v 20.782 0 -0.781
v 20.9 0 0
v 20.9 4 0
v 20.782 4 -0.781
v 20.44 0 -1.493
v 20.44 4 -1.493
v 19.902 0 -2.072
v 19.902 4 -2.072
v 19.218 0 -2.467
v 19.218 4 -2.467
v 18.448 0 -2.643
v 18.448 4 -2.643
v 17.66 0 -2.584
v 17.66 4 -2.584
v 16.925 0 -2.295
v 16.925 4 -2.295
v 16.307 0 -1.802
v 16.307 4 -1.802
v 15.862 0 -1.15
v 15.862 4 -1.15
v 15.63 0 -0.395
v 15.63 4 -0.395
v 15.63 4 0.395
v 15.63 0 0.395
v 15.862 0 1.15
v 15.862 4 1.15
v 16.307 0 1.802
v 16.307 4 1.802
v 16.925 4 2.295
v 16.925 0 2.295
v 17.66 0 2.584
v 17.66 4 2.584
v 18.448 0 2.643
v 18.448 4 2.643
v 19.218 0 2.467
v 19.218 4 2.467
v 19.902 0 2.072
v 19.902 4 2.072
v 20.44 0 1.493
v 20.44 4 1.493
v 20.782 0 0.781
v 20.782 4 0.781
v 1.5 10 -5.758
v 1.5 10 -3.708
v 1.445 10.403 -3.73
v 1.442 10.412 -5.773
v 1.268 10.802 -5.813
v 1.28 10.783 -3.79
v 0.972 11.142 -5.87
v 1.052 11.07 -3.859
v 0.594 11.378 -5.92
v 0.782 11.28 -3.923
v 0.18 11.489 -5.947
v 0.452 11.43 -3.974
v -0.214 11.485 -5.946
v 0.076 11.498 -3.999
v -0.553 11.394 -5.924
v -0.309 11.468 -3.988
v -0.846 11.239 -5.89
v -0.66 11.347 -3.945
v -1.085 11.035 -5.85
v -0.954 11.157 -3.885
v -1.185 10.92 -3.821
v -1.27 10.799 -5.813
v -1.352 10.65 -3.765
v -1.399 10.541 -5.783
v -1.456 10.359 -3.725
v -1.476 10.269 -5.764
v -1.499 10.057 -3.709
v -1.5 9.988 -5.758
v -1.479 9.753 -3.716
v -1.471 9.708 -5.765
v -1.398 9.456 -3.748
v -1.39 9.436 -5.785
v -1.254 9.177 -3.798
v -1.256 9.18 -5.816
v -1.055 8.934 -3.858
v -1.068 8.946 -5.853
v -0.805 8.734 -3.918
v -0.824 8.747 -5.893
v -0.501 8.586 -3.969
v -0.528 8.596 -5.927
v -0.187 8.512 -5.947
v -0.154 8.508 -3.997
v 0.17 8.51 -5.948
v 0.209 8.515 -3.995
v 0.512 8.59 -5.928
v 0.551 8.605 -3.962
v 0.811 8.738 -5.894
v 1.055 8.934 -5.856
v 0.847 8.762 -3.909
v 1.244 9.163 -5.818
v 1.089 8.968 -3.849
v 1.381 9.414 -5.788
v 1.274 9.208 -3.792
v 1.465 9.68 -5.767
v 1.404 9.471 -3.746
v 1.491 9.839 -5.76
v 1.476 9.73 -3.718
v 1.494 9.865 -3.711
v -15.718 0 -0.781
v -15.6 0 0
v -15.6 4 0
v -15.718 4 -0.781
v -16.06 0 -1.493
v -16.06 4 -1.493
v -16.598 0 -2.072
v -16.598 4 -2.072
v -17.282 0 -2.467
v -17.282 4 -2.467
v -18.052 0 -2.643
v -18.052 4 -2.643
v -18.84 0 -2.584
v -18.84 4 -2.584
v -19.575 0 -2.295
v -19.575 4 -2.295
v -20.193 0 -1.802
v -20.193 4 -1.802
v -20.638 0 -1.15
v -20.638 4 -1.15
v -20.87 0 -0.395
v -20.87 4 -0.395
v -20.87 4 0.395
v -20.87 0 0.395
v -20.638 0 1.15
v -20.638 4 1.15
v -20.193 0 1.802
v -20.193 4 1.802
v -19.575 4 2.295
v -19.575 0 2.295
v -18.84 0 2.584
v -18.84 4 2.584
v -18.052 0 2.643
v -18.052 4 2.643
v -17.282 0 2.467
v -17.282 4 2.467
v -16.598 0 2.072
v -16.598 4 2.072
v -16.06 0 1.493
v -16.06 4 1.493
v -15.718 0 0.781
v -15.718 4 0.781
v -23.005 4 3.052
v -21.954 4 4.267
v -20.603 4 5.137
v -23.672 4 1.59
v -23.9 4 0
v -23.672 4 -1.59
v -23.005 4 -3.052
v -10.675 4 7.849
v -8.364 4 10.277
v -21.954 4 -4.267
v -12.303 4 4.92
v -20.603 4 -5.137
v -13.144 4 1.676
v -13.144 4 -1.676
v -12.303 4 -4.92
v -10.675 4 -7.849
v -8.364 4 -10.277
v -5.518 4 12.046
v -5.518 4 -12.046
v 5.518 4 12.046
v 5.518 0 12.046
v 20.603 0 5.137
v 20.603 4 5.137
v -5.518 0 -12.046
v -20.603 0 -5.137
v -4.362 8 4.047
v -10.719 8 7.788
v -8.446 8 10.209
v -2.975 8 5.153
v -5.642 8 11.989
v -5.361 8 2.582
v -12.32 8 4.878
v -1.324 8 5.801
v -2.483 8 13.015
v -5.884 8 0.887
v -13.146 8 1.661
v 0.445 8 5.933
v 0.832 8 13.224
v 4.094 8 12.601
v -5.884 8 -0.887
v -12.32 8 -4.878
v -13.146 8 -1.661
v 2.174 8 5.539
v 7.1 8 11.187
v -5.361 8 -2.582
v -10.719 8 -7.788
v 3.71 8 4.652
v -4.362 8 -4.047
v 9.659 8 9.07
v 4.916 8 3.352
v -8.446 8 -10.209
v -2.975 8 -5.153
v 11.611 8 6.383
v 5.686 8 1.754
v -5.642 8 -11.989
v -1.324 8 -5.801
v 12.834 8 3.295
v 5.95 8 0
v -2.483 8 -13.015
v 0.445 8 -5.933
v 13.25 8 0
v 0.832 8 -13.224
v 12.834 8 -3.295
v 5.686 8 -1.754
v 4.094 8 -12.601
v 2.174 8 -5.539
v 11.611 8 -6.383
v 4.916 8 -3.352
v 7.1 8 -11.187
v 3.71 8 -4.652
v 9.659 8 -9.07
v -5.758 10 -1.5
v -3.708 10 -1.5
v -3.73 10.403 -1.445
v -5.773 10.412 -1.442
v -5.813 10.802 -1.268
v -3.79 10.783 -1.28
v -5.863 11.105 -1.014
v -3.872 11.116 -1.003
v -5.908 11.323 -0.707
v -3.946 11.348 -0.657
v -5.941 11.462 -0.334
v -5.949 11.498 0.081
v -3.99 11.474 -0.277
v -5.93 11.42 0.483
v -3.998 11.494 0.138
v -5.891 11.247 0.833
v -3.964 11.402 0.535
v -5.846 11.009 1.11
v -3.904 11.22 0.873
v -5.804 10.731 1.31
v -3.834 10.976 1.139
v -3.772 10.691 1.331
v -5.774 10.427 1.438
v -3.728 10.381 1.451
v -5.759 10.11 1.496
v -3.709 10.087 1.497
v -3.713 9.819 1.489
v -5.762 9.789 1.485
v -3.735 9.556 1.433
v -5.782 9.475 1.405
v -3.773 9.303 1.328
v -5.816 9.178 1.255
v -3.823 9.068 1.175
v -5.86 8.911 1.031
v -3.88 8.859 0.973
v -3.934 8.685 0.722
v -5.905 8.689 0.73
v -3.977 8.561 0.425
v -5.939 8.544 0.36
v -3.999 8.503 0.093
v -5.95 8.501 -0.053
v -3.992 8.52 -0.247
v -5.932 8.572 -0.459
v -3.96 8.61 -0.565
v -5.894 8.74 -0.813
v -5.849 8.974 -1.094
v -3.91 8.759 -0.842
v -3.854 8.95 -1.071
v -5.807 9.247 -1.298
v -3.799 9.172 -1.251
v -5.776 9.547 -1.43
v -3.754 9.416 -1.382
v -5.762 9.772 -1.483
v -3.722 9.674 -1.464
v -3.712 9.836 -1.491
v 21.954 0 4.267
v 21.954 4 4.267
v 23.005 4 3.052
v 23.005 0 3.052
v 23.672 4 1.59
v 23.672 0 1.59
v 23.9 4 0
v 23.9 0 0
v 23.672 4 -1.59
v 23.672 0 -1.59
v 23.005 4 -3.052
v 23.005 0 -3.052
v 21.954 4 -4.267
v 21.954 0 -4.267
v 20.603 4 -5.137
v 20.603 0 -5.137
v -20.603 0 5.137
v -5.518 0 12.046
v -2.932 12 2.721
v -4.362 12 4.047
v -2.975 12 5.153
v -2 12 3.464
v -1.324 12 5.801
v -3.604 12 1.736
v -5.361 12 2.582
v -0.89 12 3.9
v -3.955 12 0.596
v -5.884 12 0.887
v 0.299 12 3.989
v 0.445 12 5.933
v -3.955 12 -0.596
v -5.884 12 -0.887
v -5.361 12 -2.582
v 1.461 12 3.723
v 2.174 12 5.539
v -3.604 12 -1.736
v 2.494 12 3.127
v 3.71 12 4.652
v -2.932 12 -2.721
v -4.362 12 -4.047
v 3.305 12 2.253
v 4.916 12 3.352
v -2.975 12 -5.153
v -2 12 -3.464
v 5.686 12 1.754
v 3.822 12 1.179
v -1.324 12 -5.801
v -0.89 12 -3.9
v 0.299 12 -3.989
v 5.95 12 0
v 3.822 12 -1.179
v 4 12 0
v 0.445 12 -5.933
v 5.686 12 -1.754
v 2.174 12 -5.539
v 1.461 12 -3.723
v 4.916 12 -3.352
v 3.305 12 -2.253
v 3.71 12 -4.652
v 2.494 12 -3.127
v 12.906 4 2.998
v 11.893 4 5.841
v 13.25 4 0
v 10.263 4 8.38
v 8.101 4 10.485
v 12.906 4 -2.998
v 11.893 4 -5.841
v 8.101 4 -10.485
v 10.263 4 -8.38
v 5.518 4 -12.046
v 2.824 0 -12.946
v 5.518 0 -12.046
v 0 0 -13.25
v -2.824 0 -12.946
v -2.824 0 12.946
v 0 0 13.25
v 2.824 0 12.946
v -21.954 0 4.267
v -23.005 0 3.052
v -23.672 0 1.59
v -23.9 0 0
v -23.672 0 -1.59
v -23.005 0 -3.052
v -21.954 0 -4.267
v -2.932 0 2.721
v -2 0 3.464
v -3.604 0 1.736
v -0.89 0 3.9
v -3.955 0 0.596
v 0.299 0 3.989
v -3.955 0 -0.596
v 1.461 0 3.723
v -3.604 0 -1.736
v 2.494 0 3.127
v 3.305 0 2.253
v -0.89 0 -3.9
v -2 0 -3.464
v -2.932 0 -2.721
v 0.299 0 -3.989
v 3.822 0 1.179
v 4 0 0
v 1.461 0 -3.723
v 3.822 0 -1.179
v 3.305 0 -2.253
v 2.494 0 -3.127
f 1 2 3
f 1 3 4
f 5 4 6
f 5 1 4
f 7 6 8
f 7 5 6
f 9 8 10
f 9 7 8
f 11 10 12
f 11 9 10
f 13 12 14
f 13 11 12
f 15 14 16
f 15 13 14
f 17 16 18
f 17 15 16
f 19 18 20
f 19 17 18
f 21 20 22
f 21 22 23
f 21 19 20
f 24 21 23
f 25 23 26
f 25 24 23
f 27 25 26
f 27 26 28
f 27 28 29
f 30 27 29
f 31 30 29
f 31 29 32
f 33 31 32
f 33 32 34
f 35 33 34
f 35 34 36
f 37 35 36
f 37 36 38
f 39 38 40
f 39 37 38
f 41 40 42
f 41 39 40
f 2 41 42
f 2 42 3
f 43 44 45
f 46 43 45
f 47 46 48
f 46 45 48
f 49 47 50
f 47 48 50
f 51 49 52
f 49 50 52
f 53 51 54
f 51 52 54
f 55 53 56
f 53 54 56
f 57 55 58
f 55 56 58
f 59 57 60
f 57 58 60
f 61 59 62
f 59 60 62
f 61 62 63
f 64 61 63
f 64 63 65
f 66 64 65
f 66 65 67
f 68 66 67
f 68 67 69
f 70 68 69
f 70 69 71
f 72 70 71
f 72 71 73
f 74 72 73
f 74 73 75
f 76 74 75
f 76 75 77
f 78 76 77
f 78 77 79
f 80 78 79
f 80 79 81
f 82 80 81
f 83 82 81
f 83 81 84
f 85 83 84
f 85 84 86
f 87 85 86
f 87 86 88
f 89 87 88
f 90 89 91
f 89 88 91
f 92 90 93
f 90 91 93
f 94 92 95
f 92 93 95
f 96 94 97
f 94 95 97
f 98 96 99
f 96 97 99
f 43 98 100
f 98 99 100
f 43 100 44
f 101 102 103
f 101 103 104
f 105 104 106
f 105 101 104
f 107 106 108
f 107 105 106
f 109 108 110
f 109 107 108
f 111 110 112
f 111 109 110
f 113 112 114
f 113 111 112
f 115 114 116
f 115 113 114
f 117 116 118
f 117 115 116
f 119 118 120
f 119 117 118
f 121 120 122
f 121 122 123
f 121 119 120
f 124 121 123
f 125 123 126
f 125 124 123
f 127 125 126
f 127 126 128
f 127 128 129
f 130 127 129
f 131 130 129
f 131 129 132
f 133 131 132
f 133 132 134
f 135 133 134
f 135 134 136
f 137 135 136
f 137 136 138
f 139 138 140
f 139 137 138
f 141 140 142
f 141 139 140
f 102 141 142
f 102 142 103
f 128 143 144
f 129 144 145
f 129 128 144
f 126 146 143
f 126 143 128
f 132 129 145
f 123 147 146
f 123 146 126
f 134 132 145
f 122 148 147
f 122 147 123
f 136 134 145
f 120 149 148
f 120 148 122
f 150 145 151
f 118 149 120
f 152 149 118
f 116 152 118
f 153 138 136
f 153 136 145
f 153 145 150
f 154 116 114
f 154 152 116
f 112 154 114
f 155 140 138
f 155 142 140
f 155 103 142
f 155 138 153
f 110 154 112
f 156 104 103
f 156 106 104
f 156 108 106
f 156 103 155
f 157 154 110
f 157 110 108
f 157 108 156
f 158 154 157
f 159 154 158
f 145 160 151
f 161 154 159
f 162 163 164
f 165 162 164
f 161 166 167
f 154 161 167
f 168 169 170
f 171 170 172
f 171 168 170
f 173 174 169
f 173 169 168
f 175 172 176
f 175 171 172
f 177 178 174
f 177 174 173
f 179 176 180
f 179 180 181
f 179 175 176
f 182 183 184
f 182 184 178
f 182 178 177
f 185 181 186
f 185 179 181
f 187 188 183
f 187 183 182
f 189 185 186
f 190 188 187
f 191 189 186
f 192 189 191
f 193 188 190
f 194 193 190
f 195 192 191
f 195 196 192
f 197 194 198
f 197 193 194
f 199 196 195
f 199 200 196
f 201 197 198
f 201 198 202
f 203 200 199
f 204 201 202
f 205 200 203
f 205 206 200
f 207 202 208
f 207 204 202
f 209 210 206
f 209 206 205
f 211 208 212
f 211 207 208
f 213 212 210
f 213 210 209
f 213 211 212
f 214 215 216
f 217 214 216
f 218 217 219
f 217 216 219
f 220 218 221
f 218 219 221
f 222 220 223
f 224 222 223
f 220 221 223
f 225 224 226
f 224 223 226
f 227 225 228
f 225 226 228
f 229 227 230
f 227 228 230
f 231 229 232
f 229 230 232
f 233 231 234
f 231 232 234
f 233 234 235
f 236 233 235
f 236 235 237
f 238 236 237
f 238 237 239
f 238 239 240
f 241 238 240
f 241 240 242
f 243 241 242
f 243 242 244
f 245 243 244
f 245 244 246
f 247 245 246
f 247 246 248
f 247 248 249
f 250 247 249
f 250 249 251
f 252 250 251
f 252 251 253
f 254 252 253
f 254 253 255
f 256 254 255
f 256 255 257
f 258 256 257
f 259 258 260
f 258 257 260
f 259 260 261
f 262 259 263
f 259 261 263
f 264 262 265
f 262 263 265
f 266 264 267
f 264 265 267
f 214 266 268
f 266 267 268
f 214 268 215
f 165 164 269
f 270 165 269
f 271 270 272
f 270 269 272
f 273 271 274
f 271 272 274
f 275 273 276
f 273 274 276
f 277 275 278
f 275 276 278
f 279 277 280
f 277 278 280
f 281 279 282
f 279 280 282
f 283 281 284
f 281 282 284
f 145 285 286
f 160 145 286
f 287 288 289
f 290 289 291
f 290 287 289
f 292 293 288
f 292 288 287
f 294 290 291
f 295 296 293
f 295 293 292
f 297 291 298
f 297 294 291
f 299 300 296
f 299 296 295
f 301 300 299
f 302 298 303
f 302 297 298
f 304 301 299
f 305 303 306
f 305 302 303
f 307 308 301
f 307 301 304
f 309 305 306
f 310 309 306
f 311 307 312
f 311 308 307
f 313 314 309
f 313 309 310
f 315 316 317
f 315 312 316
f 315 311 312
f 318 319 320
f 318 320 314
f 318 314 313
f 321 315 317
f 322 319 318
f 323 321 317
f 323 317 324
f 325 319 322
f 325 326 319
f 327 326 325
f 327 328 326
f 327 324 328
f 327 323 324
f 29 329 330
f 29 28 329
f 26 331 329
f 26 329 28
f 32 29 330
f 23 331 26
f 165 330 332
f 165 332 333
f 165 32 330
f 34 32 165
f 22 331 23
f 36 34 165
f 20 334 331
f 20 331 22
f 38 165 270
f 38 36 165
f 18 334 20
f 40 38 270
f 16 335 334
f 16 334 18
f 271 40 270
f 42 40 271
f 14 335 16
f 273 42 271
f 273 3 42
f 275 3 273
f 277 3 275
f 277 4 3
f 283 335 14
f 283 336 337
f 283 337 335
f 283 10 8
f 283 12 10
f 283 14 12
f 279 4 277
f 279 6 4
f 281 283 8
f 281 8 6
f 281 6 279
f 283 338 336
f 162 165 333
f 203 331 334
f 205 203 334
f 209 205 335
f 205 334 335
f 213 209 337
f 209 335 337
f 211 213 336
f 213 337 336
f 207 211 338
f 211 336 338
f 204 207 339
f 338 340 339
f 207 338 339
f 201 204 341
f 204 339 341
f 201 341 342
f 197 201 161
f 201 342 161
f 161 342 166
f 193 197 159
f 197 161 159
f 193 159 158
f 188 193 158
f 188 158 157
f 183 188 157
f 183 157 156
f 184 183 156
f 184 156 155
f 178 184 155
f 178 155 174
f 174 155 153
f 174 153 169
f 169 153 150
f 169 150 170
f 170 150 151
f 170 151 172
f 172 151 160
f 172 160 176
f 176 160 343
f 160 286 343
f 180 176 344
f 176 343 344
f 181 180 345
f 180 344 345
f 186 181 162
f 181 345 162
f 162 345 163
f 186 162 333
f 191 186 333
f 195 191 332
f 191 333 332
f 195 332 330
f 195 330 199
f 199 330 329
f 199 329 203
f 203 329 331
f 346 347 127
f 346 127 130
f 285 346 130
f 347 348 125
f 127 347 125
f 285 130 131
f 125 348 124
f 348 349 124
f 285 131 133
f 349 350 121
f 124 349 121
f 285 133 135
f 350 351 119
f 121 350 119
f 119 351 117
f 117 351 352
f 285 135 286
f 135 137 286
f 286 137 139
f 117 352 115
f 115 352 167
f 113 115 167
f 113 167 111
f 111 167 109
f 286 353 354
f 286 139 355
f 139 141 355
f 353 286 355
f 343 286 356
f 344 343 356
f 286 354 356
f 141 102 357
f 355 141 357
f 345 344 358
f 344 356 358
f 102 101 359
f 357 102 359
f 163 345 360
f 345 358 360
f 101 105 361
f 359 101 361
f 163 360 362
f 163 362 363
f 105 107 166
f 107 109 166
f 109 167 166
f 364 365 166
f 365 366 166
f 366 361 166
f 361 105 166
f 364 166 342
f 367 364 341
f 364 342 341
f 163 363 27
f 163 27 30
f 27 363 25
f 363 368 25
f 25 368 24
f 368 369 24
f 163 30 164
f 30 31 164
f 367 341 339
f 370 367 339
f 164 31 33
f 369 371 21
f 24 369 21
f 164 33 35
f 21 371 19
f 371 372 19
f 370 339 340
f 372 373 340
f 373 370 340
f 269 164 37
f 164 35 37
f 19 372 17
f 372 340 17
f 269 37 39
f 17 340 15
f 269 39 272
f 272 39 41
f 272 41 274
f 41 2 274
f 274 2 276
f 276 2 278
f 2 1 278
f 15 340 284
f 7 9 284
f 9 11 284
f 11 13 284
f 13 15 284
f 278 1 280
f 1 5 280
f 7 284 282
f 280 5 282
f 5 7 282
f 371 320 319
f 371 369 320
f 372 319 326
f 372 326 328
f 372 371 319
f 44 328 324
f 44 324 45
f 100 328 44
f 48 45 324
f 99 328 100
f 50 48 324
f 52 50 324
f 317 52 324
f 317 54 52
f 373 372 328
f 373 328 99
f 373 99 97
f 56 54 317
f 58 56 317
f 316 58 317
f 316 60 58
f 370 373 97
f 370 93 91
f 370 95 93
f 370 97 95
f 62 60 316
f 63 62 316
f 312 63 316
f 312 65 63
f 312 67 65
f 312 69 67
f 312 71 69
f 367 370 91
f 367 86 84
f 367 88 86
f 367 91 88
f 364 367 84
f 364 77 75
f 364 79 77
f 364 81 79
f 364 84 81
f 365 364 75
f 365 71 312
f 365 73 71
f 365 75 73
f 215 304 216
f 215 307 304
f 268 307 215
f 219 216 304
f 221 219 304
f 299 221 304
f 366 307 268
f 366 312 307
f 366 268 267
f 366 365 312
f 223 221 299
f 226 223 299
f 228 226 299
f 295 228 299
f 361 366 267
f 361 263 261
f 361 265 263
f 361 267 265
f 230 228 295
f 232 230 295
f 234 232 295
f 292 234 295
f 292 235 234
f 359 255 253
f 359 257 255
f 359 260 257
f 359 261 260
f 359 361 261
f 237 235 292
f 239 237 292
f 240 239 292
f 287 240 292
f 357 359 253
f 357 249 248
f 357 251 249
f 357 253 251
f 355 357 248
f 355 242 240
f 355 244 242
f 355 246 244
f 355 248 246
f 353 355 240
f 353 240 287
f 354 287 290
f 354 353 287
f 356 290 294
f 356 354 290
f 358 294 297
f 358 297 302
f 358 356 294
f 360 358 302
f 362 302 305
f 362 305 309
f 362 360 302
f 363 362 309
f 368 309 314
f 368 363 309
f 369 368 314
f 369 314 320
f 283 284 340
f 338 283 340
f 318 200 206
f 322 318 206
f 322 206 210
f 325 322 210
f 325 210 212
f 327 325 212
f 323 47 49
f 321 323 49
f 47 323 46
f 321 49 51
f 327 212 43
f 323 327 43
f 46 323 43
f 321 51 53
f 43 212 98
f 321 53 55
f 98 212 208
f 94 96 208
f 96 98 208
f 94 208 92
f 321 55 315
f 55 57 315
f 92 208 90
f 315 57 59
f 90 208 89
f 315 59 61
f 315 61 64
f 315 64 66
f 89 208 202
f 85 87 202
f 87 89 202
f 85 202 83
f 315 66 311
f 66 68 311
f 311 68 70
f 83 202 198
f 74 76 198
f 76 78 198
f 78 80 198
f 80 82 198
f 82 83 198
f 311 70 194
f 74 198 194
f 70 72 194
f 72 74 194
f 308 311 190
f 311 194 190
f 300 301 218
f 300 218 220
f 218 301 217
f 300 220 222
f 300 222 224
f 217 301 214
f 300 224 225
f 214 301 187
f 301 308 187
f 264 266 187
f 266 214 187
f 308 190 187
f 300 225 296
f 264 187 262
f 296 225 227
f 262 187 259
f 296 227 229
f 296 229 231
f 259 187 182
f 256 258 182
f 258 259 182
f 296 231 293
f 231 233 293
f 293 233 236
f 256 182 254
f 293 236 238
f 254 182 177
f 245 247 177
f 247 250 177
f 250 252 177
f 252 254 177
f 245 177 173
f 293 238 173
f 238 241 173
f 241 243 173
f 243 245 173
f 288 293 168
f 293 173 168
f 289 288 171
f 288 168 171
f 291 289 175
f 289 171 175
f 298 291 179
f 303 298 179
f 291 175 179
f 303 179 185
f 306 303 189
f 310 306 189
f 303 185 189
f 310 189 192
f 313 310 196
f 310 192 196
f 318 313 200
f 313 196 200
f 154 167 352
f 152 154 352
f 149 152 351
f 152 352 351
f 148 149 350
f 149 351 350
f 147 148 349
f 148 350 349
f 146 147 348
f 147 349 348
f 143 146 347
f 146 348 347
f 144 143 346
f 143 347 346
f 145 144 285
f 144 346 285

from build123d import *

# Parameters (mm, degrees)
SKETCH_1_R            = 13.25
SKETCH_1_R_2          = 4
EXTRUDE_288_DEPTH     = 8
SKETCH_2_R            = 2.65
EXTRUDE_567_DEPTH     = 4
SKETCH_3_R            = 5.95
SKETCH_3_R_2          = 4
EXTRUDE_693_DEPTH     = 4
SKETCH_4_R            = 1.5
CUT_EXTRUDE_831_DEPTH = 14.25
SKETCH_5_R            = 1.5
CUT_EXTRUDE_2_DEPTH   = 24.9


with BuildPart() as part:
    # 草图1 → Extrude 288 (new body)
    with BuildSketch(Plane(origin=(0, 0, 0), x_dir=(1, 0, 0), z_dir=(0, 1, 0))):
        Circle(SKETCH_1_R)
        Circle(SKETCH_1_R_2, mode=Mode.SUBTRACT)
    extrude(amount=EXTRUDE_288_DEPTH)

    # 草图2 → Extrude 567 (add)
    with BuildSketch(Plane(origin=(0, 0, 0), x_dir=(1, 0, 0), z_dir=(0, 1, 0))):
        with BuildLine():
            Line((-20.602876712, -5.136776341), (-5.517808219, -12.046422392))
            Line((-5.517808219, -12.046422392), (-5.517808219, 12.046422392))
            Line((-5.517808219, 12.046422392), (-20.602876712, 5.136776341))
            ThreePointArc((-20.602876712, 5.136776341), (-23.9, 0), (-20.602876712, -5.136776341))
        make_face()
        with Locations((-18.25, 0)):
            Circle(SKETCH_2_R, mode=Mode.SUBTRACT)
        with BuildLine():
            Line((20.602876712, 5.136776341), (5.517808219, 12.046422392))
            Line((5.517808219, 12.046422392), (5.517808219, -12.046422392))
            Line((5.517808219, -12.046422392), (20.602876712, -5.136776341))
            ThreePointArc((20.602876712, -5.136776341), (23.9, 0), (20.602876712, 5.136776341))
        make_face()
        with Locations((18.25, 0)):
            Circle(SKETCH_2_R, mode=Mode.SUBTRACT)
    extrude(amount=EXTRUDE_567_DEPTH)

    # 草图3 → Extrude 693 (add)
    with BuildSketch(Plane(origin=(0, 8, 0), x_dir=(1, 0, 0), z_dir=(0, 1, 0))):
        Circle(SKETCH_3_R)
        Circle(SKETCH_3_R_2, mode=Mode.SUBTRACT)
    extrude(amount=EXTRUDE_693_DEPTH)

    # 草图4 → Cut-Extrude 831 (cut, through all)
    with BuildSketch(Plane.XY):
        with Locations((0, 10)):
            Circle(SKETCH_4_R)
    extrude(amount=-CUT_EXTRUDE_831_DEPTH, mode=Mode.SUBTRACT)

    # 草图5 → 紧定2 (cut, through all)
    with BuildSketch(Plane(origin=(0, 0, 0), x_dir=(0, 0, -1), z_dir=(1, 0, 0))):
        with Locations((0, 10)):
            Circle(SKETCH_5_R)
    extrude(amount=-CUT_EXTRUDE_2_DEPTH, mode=Mode.SUBTRACT)


solid = part.part
